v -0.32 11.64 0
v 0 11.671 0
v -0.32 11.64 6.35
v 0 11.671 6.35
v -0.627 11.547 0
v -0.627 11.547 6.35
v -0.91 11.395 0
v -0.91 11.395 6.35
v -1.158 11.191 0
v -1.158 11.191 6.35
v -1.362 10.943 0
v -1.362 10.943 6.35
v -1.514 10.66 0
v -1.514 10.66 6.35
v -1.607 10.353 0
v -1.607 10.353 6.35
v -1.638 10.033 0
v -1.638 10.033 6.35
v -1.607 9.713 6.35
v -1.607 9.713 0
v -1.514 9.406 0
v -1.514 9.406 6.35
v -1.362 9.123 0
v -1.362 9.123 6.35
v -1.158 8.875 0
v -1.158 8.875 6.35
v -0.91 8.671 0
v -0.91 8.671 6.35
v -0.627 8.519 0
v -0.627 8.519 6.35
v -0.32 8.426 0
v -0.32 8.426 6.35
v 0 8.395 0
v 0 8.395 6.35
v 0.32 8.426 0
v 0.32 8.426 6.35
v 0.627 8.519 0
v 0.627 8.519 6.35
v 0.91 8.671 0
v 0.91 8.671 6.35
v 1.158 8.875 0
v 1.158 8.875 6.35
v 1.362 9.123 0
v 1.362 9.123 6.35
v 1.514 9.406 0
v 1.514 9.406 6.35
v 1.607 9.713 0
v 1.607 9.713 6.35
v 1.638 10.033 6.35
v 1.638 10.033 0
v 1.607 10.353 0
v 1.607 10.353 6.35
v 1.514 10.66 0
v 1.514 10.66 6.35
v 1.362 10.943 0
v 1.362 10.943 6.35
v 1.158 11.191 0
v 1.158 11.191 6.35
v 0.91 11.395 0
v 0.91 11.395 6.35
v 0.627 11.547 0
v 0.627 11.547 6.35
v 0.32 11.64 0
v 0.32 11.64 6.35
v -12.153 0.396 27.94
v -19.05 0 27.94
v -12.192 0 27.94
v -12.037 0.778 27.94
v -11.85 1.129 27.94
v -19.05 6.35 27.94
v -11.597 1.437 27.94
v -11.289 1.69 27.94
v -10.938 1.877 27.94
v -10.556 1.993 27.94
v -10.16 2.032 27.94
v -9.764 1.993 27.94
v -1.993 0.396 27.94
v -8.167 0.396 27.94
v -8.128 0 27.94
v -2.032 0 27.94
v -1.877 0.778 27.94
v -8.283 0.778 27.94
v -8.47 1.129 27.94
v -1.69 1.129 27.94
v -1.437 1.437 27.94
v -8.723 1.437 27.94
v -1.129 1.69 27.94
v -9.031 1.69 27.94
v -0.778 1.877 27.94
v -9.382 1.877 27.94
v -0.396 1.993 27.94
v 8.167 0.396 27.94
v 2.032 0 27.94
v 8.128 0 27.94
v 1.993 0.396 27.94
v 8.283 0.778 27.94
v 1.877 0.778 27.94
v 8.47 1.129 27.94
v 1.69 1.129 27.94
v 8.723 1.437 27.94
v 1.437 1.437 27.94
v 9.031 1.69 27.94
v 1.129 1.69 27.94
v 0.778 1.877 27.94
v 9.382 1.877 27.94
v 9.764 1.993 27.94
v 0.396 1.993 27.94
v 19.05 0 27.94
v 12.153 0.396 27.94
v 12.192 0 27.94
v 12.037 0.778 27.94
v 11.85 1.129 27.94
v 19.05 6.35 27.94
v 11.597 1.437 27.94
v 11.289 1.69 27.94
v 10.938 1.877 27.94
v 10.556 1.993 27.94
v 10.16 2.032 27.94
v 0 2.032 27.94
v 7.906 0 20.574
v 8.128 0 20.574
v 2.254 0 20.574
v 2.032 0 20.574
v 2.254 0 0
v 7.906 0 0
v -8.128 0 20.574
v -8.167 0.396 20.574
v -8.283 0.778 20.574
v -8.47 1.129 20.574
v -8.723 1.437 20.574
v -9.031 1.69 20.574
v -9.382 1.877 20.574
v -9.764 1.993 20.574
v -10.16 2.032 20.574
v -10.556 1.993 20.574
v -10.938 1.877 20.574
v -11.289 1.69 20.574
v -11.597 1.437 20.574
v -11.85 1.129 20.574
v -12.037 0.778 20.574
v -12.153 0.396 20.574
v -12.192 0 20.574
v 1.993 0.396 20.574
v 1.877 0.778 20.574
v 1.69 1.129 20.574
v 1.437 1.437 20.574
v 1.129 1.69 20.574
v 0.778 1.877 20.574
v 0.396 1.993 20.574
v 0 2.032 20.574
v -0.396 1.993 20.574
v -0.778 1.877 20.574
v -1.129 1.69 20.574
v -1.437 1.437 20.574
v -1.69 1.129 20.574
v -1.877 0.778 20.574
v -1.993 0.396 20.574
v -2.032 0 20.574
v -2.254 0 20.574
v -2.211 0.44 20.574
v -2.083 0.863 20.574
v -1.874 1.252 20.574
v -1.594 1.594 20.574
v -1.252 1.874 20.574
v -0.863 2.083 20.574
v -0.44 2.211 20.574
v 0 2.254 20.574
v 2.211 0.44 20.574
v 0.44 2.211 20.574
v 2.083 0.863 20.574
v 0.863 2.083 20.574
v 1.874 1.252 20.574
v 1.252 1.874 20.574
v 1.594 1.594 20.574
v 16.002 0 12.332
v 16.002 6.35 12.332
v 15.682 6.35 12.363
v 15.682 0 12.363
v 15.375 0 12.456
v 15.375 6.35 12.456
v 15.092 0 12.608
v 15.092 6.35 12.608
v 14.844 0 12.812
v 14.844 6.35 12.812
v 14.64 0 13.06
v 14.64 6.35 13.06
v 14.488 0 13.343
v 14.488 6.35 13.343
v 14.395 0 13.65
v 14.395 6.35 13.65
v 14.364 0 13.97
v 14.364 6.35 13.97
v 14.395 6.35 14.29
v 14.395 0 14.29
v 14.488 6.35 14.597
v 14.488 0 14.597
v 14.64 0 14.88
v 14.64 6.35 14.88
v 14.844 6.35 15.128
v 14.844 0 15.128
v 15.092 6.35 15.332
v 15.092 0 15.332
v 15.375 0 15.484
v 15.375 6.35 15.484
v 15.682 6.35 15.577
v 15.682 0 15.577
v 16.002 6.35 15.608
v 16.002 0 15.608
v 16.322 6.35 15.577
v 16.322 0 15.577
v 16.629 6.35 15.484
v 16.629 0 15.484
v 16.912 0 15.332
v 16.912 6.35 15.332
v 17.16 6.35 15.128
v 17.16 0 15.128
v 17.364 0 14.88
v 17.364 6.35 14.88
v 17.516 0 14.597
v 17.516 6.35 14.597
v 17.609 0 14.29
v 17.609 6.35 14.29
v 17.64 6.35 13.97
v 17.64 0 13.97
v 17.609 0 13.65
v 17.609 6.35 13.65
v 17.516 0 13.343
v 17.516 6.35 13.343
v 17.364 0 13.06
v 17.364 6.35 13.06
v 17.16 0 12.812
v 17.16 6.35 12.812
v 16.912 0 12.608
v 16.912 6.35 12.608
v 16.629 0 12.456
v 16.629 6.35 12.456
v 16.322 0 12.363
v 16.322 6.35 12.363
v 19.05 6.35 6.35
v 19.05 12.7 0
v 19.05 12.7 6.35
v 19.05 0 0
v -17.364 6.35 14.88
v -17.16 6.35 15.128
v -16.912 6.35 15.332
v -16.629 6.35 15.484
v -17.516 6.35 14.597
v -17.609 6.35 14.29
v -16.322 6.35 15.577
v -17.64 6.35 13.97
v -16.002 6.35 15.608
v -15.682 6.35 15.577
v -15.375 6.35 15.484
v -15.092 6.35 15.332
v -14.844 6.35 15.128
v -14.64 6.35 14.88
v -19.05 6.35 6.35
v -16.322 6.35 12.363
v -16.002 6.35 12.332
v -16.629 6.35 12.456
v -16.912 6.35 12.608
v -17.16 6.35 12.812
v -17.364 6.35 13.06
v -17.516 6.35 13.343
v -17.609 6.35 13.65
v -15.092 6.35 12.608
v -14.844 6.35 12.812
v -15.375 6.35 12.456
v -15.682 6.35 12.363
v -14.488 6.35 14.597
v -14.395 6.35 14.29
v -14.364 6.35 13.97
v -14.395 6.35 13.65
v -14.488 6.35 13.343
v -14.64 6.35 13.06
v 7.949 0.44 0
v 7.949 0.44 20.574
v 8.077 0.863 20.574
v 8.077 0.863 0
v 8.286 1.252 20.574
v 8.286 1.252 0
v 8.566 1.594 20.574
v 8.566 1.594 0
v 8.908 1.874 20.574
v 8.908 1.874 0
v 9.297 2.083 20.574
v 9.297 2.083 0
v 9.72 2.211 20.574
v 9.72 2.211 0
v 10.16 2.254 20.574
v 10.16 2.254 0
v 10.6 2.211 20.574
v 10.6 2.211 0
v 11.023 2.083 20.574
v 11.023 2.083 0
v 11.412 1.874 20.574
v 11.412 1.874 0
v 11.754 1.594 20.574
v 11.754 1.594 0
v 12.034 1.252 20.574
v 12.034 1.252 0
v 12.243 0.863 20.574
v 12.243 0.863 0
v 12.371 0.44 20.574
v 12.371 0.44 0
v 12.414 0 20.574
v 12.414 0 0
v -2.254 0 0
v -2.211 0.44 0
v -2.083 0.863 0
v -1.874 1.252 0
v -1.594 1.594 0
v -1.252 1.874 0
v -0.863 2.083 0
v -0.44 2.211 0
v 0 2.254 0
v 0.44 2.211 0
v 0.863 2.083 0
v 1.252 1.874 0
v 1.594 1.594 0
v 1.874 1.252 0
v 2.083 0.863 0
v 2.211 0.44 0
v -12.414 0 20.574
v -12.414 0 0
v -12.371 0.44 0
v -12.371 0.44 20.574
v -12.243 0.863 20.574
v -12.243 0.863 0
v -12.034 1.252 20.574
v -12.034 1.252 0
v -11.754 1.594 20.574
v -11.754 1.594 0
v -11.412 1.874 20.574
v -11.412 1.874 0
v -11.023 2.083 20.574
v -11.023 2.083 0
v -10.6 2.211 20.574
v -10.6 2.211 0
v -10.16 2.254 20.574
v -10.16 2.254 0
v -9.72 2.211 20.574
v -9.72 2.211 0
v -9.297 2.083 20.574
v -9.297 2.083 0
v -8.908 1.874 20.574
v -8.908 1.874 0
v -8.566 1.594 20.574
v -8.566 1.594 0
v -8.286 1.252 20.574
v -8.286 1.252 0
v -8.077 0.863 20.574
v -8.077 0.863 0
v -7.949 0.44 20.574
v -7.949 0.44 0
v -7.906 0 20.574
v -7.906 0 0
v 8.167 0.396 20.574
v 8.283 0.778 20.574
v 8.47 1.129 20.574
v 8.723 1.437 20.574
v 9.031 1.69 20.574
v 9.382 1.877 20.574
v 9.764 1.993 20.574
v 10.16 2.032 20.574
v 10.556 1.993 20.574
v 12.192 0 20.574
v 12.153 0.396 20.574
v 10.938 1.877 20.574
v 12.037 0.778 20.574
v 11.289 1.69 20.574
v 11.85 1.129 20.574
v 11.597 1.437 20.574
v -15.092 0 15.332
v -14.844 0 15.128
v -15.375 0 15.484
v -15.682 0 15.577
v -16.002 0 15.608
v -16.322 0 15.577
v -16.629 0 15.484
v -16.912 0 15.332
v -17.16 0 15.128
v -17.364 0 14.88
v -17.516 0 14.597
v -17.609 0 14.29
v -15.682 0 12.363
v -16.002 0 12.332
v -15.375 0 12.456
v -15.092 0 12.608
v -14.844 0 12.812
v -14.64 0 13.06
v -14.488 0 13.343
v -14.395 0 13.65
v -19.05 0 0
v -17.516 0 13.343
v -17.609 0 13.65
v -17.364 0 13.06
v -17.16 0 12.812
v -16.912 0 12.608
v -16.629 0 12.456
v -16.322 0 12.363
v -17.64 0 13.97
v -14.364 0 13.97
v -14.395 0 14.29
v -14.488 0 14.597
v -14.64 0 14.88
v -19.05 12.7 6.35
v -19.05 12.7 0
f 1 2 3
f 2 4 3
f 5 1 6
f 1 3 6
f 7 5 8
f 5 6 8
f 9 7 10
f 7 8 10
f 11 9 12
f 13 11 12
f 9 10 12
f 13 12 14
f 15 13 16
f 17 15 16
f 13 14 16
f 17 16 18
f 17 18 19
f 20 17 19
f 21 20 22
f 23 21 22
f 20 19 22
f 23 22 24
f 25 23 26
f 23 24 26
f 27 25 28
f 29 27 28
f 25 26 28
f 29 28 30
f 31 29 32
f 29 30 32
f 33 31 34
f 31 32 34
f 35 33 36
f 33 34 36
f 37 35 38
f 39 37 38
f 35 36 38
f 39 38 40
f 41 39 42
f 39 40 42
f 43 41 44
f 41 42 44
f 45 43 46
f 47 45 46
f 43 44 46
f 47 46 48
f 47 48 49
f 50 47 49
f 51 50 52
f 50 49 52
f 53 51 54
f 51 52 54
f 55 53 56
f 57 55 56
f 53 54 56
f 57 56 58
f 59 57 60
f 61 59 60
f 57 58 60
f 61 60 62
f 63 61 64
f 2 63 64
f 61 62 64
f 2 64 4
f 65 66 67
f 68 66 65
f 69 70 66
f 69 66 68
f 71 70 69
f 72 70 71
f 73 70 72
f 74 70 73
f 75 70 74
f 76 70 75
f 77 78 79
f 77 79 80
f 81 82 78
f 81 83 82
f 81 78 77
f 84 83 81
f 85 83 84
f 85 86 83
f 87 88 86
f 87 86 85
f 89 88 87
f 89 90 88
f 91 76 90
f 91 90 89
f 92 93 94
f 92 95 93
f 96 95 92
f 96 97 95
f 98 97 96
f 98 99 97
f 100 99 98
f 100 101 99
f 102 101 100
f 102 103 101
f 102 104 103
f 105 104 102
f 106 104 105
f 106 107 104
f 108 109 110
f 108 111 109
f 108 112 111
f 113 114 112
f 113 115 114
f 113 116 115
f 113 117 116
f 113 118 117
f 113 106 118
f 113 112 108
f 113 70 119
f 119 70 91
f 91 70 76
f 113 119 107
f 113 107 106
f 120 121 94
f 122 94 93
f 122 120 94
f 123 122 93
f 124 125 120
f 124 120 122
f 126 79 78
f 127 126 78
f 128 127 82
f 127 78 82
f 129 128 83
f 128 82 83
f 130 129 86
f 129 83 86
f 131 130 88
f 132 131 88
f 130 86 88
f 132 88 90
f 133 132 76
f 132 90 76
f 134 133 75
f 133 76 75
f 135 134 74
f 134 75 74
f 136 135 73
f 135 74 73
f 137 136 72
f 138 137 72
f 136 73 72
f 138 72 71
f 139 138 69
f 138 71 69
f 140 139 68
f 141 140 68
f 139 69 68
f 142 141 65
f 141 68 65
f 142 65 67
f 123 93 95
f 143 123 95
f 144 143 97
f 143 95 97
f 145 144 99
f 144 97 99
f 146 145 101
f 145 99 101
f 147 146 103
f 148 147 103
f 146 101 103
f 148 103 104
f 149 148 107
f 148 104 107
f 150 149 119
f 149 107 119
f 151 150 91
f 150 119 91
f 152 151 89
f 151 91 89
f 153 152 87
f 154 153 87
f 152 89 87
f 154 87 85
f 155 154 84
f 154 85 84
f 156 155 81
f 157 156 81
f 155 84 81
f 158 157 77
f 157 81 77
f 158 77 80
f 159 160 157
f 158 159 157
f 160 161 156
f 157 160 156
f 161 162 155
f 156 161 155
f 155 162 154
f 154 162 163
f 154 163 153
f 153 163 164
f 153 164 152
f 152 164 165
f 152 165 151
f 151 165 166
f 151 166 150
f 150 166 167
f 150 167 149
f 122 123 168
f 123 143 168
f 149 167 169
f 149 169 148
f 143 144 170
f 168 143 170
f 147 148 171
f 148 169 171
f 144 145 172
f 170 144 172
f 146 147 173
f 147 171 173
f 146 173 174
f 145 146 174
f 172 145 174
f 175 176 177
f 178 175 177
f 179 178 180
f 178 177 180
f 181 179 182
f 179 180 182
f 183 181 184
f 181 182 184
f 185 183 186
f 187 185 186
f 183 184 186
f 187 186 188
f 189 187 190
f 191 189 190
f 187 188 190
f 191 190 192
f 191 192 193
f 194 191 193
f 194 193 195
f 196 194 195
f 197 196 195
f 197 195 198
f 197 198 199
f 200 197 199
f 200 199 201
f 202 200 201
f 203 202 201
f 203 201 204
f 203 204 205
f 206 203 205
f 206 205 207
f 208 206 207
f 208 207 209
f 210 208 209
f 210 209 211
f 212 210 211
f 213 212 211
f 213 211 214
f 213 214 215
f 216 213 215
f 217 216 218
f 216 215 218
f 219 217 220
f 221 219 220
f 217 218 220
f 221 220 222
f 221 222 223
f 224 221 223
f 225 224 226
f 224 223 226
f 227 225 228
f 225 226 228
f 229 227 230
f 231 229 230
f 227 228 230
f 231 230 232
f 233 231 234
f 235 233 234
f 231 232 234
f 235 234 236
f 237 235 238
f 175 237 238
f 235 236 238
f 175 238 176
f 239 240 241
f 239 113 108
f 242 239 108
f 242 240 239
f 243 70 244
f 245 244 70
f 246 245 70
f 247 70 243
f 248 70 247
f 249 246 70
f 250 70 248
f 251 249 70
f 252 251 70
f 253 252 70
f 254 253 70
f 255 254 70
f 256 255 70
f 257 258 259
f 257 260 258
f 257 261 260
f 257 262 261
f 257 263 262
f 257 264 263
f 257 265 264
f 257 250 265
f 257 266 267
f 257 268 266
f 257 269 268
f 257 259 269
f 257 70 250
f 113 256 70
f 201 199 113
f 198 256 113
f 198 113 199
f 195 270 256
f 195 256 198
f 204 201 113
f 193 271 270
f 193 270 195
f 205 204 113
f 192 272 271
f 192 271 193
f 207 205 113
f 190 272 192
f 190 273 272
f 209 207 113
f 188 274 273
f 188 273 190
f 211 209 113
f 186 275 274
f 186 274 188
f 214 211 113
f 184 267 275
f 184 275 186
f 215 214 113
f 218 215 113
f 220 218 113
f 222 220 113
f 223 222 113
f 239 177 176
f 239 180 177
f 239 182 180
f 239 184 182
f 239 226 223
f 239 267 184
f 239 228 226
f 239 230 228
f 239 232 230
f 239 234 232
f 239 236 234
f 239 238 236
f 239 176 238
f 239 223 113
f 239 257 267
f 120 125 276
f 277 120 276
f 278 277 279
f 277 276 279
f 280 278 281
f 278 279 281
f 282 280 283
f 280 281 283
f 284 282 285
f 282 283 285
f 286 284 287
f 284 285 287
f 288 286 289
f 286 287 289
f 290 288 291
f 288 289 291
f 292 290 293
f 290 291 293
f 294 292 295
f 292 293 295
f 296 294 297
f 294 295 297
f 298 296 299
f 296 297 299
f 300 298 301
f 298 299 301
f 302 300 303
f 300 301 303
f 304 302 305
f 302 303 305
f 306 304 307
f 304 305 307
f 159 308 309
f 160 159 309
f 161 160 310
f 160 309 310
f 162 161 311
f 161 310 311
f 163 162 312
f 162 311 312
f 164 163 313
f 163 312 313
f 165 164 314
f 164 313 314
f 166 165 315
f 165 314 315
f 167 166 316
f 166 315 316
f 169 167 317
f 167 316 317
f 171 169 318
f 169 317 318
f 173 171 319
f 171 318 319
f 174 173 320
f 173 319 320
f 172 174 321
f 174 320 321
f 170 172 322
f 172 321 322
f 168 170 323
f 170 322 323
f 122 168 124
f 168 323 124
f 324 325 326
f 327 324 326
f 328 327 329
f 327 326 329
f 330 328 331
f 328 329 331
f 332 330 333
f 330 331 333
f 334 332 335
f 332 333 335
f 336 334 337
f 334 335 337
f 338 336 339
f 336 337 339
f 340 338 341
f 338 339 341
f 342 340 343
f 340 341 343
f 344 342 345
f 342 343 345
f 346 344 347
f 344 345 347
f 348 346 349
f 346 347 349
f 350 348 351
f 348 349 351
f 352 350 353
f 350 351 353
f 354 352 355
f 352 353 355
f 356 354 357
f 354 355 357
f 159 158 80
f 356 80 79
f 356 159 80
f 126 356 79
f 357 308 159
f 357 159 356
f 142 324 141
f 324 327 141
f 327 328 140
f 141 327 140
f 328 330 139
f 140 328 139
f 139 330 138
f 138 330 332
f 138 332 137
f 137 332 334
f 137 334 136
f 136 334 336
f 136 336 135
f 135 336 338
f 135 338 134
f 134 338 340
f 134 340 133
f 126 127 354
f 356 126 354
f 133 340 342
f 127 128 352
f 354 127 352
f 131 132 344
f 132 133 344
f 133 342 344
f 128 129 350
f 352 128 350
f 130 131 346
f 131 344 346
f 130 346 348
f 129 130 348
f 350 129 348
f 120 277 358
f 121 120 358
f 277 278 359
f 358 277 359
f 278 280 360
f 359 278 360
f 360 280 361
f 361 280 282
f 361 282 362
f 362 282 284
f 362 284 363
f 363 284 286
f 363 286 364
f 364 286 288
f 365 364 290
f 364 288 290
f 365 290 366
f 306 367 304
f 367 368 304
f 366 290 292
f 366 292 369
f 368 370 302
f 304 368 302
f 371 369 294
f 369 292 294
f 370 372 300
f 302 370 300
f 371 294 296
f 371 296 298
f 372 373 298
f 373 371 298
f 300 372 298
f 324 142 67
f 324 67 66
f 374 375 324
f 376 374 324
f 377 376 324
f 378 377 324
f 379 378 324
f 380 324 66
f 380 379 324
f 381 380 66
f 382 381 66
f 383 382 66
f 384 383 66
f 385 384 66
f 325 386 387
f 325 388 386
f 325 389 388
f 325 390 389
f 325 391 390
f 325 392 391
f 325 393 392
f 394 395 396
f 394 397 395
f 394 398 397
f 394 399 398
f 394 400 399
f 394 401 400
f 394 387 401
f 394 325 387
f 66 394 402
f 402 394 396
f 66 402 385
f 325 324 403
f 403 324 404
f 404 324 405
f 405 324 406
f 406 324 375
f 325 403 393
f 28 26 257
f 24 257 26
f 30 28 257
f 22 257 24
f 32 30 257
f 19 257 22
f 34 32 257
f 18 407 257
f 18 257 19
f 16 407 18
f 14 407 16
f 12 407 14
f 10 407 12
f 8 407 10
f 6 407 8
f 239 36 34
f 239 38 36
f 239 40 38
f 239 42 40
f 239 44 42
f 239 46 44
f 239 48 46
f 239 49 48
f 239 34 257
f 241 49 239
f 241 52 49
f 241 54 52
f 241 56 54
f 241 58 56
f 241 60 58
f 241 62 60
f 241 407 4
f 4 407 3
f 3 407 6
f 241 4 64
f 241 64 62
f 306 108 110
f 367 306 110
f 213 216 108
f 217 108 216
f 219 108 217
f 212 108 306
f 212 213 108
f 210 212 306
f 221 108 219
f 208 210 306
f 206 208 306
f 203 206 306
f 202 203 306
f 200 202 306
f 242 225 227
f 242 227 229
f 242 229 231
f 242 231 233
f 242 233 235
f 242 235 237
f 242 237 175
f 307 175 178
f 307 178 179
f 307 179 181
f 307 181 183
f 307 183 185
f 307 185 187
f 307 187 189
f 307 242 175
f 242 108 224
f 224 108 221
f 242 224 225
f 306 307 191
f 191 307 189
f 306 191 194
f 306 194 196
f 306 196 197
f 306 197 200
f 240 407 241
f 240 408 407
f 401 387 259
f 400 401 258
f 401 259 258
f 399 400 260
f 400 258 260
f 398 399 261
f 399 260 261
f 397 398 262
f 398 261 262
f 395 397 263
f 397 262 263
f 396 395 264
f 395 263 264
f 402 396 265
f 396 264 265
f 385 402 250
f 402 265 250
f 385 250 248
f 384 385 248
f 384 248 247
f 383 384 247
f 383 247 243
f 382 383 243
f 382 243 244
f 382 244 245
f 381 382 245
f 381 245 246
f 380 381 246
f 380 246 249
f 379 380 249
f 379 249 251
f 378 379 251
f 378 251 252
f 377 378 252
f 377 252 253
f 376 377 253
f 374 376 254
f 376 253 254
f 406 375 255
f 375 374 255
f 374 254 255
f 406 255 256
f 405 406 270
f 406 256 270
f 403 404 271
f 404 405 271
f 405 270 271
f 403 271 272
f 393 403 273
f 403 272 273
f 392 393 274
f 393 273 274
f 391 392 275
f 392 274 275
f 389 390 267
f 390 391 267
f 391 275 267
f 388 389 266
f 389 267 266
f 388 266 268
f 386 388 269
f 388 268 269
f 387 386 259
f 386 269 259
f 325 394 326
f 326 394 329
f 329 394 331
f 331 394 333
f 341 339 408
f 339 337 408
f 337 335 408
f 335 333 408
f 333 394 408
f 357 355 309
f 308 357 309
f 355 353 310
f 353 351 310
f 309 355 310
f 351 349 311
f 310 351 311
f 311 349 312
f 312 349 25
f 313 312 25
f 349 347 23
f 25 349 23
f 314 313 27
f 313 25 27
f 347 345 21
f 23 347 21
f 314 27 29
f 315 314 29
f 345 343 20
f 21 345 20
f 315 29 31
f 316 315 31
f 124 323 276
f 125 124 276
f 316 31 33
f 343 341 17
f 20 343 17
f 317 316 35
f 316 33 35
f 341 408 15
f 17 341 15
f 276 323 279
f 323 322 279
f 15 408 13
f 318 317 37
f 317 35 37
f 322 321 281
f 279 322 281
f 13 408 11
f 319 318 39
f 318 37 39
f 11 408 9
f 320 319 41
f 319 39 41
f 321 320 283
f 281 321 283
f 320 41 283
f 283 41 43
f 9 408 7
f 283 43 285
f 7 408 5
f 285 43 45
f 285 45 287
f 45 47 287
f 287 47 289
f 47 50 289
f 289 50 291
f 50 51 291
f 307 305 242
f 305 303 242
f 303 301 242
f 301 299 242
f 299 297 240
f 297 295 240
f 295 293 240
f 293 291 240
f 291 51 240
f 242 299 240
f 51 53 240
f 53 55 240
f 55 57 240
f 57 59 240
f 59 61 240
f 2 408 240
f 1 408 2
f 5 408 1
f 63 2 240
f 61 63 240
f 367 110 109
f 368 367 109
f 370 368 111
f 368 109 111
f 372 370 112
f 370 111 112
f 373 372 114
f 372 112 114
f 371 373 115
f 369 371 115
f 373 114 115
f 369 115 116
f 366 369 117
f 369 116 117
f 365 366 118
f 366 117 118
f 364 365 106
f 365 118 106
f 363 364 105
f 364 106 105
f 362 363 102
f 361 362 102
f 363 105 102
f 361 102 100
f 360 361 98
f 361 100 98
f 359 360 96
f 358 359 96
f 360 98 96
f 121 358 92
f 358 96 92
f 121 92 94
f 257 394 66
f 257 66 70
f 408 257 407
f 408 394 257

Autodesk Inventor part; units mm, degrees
ref_plane "YZ Plane" through (0, 0, 0) normal (1, 0, 0) x (0, 1, 0)
ref_plane "XZ Plane" through (0, 0, 0) normal (0, 1, 0) x (-1, 0, 0)
ref_plane "XY Plane" through (0, 0, 0) normal (0, 0, 1) x (1, 0, 0)
sketch "Sketch1" plane through (0, 0, 0) normal (0, 0, 1) x (1, 0, 0)
  circle A0 centre (-10.16, 0) radius 2.2543
  circle A1 centre (0, 0) radius 2.2543
  circle A2 centre (10.16, 0) radius 2.2543
  line L0 (-19.05, 6.35) -> (19.05, 6.35)
  line L1 (19.05, 6.35) -> (19.05, 0)
  line L2 (19.05, 0) -> (-19.05, 0)
  line L3 (-19.05, 0) -> (-19.05, 6.35)
  dimension "d0" = 4.5085
  dimension "d3" = 10.16
  dimension "d4" = 10.16
  dimension "d5" = 6.35
  dimension "d6" = 38.1
extrude "Extrusion1" add sketch "Sketch1" along normal blind 27.94 contours L2 A0 | A0 L2 L3 L0 L1 A2 A1 | A1 L2 | A2 L2 picked at (-10.9114, 0.6984) picked at (0.5625, 0.4983) picked at (9.4728, 0.529)
extrude "Extrusion2" cut sketch "Sketch1" along normal blind 20.574 contours L2 A0 | A0 L2 | L2 A1 | A1 L2 | L2 A2 | A2 L2
sketch "Sketch2" plane through (0, 0, 27.94) normal (0, 0, 1) x (1, 0, 0)
  circle A0 centre (0, 0) radius 2.2543 projected
  circle A1 centre (10.16, 0) radius 2.2543 projected
  circle A2 centre (-10.16, 0) radius 2.2543 projected
  circle A3 centre (-10.16, 0) radius 2.032
  circle A4 centre (0, 0) radius 2.032
  circle A5 centre (10.16, 0) radius 2.032
  dimension "d11" = 4.064
extrude "Extrusion3" cut sketch "Sketch2" against normal through all contours A3 | A4 | A5
sketch "Sketch3" plane through (0, 0, 0) normal (0, 1, 0) x (-1, 0, 0)
  point P0 (-16.002, 13.97)
  point P1 (0, 0)
  dimension "d38" = 13.97
  dimension "d39" = 16.002
hole "Hole1" at (16.002, 0, 13.97) direction (0, 1, 0) diameter 3.2766 end through all clearance for "Oval Head Machine Screw" size "#4" standard "Ansi Unified Screw Threads"
mirror "Mirror1" about plane through (0, 0, 0) normal (1, 0, 0) of "Hole1"
sketch "Sketch7" plane through (0, 0, 0) normal (0, 0, 1) x (1, 0, 0)
  line L0 (-19.05, 6.35) -> (19.05, 6.35) projected
  line L1 (19.05, 6.35) -> (-19.05, 6.35)
  line L2 (-19.05, 6.35) -> (-19.05, 12.7)
  line L3 (-19.05, 12.7) -> (19.05, 12.7)
  line L4 (19.05, 12.7) -> (19.05, 6.35)
  point P0 (0, 10.033)
  point P1 (0, 0)
  point P2 (0, 10.033)
  dimension "d40" = 6.35
  dimension "d41" = 3.683
extrude "Extrusion5" add sketch "Sketch7" along normal blind 6.35
hole "Hole2" at (0, 10.033, 0) direction (0, 0, 1) diameter 3.2766 end through all clearance for "Oval Head Machine Screw" size "#4" standard "Ansi Unified Screw Threads"
sketch "Sketch8" plane through (0, 0, 0) normal (0, 0, -1) x (-1, 0, 0)
  line L0 (19.05, 12.7) -> (19.05, 0) projected
  line L1 (-19.05, 12.7) -> (-19.05, 0) projected
  line L2 (-19.05, 12.7) -> (19.05, 12.7) projected
  line L3 (15.24, 0) -> (15.24, 16.51)
  line L4 (15.24, 16.51) -> (-22.86, 16.51)
  line L5 (-22.86, 16.51) -> (-22.86, 0)
  line L6 (-22.86, 0) -> (-19.05, 0)
  line L7 (19.05, 0) -> (15.24, 0)
  point P0 (19.05, 6.35)
  point P1 (-19.05, 6.35)
  dimension "d49" = 3.81
extrude "Extrusion6" [suppressed]
sketch "Sketch9" plane through (0, 0, 0) normal (0, 0, -1) x (-1, 0, 0)
  line L0 (19.05, 0) -> (19.05, 6.35) projected
  line L1 (-19.05, 6.35) -> (-19.05, 0) projected
  line L2 (-22.86, 0) -> (-22.86, 6.35)
  line L3 (22.86, 6.35) -> (22.86, 0)
  line L4 (-22.86, 0) -> (-19.05, 0)
  line L5 (19.05, 0) -> (22.86, 0)
  line L6 (-22.86, 6.35) -> (-19.05, 6.35)
  line L7 (19.05, 6.35) -> (22.86, 6.35)
  line L8 (-19.05, 6.35) -> (-19.05, 0)
  dimension "d48" = 3.81
extrude "Extrusion7" [suppressed]
equation "\"d49\" = FlangeWidth"
equation "\"d48\" = FlangeWidth"
equation "\"FlangeWidth\" = 3.81"
properties part number "keyhole holder-01"
